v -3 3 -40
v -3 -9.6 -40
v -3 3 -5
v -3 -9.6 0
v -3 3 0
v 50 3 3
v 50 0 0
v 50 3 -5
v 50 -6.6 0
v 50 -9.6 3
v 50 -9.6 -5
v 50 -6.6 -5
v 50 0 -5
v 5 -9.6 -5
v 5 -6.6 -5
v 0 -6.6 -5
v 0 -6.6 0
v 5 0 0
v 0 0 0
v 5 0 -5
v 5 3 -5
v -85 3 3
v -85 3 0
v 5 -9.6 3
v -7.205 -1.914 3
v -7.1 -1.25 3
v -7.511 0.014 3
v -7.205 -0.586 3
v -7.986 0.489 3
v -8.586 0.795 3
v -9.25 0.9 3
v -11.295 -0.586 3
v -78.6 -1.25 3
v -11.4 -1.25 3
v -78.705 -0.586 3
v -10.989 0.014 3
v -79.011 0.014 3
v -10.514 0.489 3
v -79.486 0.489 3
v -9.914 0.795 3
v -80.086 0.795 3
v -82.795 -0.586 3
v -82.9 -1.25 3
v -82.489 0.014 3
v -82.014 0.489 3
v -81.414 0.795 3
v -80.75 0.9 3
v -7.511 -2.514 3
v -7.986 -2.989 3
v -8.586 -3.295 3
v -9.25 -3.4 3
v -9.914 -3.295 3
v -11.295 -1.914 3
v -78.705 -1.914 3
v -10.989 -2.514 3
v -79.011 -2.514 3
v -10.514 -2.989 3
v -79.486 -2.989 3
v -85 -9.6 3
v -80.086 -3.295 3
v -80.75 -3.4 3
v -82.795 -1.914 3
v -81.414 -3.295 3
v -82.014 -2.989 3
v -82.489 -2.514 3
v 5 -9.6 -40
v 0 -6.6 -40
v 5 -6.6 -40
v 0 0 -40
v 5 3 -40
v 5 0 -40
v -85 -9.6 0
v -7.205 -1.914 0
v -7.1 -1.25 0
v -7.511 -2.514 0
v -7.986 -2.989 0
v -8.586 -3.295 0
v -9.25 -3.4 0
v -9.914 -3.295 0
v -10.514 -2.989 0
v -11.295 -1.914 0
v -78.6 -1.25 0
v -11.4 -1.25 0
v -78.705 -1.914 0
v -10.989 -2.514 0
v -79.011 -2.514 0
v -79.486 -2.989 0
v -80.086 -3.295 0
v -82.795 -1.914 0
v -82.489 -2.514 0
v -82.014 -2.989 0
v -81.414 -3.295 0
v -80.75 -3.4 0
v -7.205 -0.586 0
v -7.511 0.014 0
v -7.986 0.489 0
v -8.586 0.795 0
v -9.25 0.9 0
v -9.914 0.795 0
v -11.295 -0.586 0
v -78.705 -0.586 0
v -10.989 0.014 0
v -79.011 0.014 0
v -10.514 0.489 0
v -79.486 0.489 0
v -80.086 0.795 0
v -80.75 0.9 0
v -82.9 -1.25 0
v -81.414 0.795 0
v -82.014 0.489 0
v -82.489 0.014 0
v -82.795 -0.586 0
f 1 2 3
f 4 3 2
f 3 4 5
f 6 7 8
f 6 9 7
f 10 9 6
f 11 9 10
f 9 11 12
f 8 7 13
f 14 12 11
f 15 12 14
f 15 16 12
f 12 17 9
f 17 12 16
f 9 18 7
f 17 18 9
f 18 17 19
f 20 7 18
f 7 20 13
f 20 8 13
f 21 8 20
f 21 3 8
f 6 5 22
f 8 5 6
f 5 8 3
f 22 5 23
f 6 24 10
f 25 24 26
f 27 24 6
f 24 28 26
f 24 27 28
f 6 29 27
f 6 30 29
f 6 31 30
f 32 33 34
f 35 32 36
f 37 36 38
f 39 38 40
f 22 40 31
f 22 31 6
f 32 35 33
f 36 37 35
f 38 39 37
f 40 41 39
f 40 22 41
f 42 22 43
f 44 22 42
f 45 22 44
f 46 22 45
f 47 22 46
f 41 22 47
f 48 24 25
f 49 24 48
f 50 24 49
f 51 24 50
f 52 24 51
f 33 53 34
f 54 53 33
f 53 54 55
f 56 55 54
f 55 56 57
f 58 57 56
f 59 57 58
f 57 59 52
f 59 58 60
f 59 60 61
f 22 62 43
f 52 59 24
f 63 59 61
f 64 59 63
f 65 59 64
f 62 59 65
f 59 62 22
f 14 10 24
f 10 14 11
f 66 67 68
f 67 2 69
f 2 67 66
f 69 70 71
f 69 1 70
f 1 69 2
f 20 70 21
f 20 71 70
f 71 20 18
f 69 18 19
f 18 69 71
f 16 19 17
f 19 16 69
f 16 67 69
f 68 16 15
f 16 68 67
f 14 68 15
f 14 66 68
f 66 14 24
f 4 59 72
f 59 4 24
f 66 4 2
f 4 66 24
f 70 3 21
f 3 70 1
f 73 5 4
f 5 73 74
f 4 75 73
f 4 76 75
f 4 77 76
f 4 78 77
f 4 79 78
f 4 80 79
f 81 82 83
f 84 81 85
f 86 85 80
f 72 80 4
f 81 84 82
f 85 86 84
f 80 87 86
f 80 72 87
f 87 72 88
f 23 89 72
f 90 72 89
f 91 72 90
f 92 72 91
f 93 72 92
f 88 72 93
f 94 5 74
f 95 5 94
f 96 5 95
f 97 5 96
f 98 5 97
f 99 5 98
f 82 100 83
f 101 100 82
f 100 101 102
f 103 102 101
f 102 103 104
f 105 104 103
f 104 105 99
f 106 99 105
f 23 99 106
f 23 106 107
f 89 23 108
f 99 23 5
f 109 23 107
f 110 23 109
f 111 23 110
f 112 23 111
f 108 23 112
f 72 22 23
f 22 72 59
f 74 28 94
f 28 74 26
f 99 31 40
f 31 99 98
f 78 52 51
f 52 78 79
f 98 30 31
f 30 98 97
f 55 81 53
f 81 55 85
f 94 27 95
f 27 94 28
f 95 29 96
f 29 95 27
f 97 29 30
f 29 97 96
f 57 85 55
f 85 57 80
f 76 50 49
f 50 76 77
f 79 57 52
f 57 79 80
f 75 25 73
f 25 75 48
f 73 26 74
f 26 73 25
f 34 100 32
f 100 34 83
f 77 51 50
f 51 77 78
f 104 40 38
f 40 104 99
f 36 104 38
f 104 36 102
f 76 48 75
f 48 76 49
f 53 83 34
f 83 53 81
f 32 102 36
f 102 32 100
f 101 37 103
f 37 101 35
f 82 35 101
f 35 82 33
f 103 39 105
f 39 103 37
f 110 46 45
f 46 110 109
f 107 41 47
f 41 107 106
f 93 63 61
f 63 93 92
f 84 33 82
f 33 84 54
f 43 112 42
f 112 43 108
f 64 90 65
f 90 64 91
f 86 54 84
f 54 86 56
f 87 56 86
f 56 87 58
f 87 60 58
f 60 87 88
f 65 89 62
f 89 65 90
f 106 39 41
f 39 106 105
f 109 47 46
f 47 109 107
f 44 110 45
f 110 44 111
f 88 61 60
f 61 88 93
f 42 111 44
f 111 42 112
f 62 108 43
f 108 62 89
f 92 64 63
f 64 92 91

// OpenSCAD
/* [General] */
layout = "mount"; // [mount, clamptest]
wall_thickness = 3;

/* [Clamp Dimensions] */
// Extra clearance for the clamp. Print off the clamp test first to see what is right for you.
clamp_clearance = .1;
// X axis is front to back on the M2.
clamp_x_length = 50;
// Z is left to right across the M2. 40mm is about as far as you can go before the extruder carriage will clonk into the mount at the end of its travel.
clamp_z_length = 40;
// How far the clamp should extend inward from the edge. 5mm is about as far as you can go before contacting the V rail.
lip_depth = 5;
// Thickness of the gantry platform. You should not have to change this; edit clamp_clearance instead.
clamp_gap = 6.5;


/* [Fan Dimensions] */
// Exterior width of the fan.
fan_width = 80;
// How far off from the front face of the clamp you want to offset the fan by.
fan_offset = 2;
fan_screw_diameter = 4.3;
fan_screw_clearance = .2;
fan_depth = 25;
// Extra length for the fan pegs to extend beyond the face of the fan.
fan_depth_extra = 2;
fan_screw_centers_length = 71.5;

/* [Hidden] */
fan_screw_border = (fan_width - fan_screw_centers_length - fan_screw_diameter) / 2;
fan_screw_center_offset = fan_screw_border + fan_screw_diameter/2;
slop = .1; // for avoiding coincident faces

module clamp(h, c = clamp_clearance) {
  linear_extrude(height = h)
  difference() {
    translate([-wall_thickness, -wall_thickness])
    square([clamp_gap + c + 2*wall_thickness, lip_depth + wall_thickness]);

    square([clamp_gap + c, lip_depth + slop]);
  }
}

module screw_insert() {
  rotate([180, 0, 0])
  cylinder(h = fan_depth + fan_depth_extra, r = fan_screw_diameter/2 - fan_screw_clearance);
}


module mount() {
  right_screw_x = -wall_thickness - fan_offset - fan_screw_center_offset;
  screws_y = wall_thickness - fan_screw_center_offset;

  difference() {
    union() {
      // x clamp (front to back)
      rotate([-90, 0, -90])
      translate([0, 0, -wall_thickness])
      clamp(clamp_x_length + wall_thickness);

      // y clamp (left to right)
      rotate([180, 0, 90])
      translate([-(clamp_gap + clamp_clearance), 0, -wall_thickness])
      clamp(clamp_z_length + wall_thickness);

      // fan mount
      translate([-wall_thickness - fan_offset - fan_width, -clamp_gap - clamp_clearance - wall_thickness])
      cube([fan_offset + fan_width, clamp_gap + clamp_clearance + 2 * wall_thickness, wall_thickness]);


      /*
      translate([right_screw_x, screws_y, 0])
      screw_insert();

      translate([right_screw_x - fan_screw_centers_length, screws_y, 0])
      screw_insert();
      */
    }
    // Use 6-32 or 8-32 1 1/4" screws instead of printed holders
    translate([right_screw_x, screws_y, -slop])
    cylinder(h = wall_thickness + 2*slop, r = fan_screw_diameter/2, $fn = 20);

    translate([right_screw_x - fan_screw_centers_length, screws_y, -slop])
    cylinder(h = wall_thickness + 2*slop, r = fan_screw_diameter/2, $fn = 20);
  }
}

module clamp_test() {
  for (i = [0 : 3]) {
    translate([15 * i, 0]) clamp(10, -.1 + i * .1);
  }
}

if (layout == "clamptest") clamp_test();
else mount();

/*
module fan() {
  difference() {
    cube([fan_width, fan_width, fan_depth]);

    translate([fan_screw_center_offset, fan_screw_center_offset + fan_screw_centers_length, -slop])
    cylinder(h = fan_depth + 2 * slop, r = fan_screw_diameter/2);

    translate([fan_screw_center_offset + fan_screw_centers_length, fan_screw_center_offset + fan_screw_centers_length, -slop])
    cylinder(h = fan_depth + 2 * slop, r = fan_screw_diameter/2);
  }
}

%translate([-wall_thickness - fan_offset - fan_width, wall_thickness - fan_width, -fan_depth])
fan();
*/
